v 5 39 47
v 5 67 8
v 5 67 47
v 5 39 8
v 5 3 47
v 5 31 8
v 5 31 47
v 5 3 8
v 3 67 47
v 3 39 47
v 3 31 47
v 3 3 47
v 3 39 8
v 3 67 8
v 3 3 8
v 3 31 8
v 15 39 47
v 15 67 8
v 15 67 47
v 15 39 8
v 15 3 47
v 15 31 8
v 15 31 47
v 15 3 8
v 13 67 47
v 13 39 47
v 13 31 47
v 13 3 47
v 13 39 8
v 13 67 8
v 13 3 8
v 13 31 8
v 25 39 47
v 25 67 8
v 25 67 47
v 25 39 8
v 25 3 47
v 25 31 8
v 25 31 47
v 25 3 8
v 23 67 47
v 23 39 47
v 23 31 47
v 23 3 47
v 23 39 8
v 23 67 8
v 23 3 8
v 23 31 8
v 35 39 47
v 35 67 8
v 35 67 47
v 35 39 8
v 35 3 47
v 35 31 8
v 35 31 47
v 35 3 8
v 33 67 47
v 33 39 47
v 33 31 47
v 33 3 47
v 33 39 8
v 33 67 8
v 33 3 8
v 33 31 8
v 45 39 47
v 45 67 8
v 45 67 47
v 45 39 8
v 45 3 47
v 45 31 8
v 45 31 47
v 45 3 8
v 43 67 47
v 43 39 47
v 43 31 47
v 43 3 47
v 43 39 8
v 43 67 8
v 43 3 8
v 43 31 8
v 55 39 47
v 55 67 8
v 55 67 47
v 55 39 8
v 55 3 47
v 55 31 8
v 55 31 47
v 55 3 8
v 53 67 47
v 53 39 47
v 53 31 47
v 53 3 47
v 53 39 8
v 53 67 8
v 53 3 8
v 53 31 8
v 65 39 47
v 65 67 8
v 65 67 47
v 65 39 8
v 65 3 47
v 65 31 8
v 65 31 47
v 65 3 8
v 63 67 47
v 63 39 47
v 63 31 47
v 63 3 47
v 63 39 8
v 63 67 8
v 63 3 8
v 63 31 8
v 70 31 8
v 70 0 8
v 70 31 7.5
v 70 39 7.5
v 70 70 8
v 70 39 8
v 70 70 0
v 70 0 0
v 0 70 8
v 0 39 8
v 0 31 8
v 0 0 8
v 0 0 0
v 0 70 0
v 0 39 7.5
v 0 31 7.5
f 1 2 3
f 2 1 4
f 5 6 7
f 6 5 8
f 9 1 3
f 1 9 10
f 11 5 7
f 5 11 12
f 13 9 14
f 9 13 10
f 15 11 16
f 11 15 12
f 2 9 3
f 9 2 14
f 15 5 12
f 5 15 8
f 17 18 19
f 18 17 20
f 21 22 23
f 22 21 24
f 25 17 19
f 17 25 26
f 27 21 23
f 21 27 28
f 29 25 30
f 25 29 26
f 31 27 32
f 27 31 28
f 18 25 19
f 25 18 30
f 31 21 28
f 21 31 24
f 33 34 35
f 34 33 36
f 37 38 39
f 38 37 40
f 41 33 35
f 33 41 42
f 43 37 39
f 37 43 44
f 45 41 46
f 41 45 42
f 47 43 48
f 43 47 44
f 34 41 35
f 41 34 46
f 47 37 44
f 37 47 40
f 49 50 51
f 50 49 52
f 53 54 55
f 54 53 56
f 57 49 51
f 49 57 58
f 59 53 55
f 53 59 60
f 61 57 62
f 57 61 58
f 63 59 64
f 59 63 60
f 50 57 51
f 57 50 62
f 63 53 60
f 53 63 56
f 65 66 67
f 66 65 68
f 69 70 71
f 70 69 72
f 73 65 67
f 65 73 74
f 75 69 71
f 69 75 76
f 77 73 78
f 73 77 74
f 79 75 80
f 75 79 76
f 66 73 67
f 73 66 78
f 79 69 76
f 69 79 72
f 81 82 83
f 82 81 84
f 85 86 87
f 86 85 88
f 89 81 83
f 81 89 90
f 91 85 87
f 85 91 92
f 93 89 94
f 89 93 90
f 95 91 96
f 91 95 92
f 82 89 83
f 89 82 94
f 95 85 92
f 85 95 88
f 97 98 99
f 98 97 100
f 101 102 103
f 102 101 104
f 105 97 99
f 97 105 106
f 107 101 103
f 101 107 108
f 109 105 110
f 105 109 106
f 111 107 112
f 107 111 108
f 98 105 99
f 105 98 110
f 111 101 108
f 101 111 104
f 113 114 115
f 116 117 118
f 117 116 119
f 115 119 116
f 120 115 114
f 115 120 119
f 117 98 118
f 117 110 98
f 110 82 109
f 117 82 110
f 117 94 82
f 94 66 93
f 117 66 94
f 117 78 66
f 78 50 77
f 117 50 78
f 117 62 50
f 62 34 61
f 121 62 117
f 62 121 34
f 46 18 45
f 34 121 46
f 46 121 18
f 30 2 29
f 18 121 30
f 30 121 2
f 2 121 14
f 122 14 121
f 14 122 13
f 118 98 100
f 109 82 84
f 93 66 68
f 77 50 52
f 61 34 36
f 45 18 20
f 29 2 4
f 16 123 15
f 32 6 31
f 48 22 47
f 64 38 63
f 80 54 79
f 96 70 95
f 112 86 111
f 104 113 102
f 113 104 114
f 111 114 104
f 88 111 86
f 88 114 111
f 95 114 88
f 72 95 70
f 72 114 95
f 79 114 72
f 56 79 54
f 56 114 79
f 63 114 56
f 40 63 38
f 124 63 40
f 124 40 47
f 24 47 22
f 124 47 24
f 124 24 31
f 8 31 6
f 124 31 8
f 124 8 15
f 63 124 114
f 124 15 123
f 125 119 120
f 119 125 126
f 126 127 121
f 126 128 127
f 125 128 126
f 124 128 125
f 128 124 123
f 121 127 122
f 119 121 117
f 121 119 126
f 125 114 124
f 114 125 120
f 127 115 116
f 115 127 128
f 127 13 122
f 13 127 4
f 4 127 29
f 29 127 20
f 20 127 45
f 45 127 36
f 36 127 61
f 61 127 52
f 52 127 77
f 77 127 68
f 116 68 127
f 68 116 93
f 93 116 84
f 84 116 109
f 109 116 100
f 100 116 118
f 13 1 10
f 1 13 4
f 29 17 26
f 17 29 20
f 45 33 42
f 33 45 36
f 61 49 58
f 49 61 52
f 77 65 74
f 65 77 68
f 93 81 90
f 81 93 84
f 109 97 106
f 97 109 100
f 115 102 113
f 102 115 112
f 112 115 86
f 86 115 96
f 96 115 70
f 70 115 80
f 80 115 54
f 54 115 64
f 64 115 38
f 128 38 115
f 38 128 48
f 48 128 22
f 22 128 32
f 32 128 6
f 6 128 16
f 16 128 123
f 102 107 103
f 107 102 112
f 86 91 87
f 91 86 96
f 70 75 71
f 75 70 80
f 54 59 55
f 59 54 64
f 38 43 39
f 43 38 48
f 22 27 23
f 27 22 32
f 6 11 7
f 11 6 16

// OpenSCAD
$fn = 32;

// ----------------------------------------------------------------------
// Heatsink: slotted fin block
// ----------------------------------------------------------------------

// --- parameters (mm) ---
base_l = 70;              // base length, X
base_w = 70;              // base width, Y
base_t = 8;               // base plate thickness
fin_h = 40;               // fin height above the base
fin_t = 2;                // fin thickness
edge = 3;                 // margin from the base ends
pitch = 10;               // fin pitch
slot_w = 8;               // central slot width, Y

n_fins = floor((base_l - 2 * edge - fin_t) / pitch) + 1;  // fin count
total_h = base_t + fin_h - 1;  // overall height

difference() {
union() {
  cube([base_l, base_w, base_t]);
  for (i = [0 : n_fins - 1])
    translate([edge + i * pitch, edge, base_t - 1])
      cube([fin_t, base_w - 2 * edge, fin_h]);
}
  translate([-1, base_w / 2 - slot_w / 2, base_t - 0.5])
    cube([base_l + 2, slot_w, fin_h + 2]);
}
